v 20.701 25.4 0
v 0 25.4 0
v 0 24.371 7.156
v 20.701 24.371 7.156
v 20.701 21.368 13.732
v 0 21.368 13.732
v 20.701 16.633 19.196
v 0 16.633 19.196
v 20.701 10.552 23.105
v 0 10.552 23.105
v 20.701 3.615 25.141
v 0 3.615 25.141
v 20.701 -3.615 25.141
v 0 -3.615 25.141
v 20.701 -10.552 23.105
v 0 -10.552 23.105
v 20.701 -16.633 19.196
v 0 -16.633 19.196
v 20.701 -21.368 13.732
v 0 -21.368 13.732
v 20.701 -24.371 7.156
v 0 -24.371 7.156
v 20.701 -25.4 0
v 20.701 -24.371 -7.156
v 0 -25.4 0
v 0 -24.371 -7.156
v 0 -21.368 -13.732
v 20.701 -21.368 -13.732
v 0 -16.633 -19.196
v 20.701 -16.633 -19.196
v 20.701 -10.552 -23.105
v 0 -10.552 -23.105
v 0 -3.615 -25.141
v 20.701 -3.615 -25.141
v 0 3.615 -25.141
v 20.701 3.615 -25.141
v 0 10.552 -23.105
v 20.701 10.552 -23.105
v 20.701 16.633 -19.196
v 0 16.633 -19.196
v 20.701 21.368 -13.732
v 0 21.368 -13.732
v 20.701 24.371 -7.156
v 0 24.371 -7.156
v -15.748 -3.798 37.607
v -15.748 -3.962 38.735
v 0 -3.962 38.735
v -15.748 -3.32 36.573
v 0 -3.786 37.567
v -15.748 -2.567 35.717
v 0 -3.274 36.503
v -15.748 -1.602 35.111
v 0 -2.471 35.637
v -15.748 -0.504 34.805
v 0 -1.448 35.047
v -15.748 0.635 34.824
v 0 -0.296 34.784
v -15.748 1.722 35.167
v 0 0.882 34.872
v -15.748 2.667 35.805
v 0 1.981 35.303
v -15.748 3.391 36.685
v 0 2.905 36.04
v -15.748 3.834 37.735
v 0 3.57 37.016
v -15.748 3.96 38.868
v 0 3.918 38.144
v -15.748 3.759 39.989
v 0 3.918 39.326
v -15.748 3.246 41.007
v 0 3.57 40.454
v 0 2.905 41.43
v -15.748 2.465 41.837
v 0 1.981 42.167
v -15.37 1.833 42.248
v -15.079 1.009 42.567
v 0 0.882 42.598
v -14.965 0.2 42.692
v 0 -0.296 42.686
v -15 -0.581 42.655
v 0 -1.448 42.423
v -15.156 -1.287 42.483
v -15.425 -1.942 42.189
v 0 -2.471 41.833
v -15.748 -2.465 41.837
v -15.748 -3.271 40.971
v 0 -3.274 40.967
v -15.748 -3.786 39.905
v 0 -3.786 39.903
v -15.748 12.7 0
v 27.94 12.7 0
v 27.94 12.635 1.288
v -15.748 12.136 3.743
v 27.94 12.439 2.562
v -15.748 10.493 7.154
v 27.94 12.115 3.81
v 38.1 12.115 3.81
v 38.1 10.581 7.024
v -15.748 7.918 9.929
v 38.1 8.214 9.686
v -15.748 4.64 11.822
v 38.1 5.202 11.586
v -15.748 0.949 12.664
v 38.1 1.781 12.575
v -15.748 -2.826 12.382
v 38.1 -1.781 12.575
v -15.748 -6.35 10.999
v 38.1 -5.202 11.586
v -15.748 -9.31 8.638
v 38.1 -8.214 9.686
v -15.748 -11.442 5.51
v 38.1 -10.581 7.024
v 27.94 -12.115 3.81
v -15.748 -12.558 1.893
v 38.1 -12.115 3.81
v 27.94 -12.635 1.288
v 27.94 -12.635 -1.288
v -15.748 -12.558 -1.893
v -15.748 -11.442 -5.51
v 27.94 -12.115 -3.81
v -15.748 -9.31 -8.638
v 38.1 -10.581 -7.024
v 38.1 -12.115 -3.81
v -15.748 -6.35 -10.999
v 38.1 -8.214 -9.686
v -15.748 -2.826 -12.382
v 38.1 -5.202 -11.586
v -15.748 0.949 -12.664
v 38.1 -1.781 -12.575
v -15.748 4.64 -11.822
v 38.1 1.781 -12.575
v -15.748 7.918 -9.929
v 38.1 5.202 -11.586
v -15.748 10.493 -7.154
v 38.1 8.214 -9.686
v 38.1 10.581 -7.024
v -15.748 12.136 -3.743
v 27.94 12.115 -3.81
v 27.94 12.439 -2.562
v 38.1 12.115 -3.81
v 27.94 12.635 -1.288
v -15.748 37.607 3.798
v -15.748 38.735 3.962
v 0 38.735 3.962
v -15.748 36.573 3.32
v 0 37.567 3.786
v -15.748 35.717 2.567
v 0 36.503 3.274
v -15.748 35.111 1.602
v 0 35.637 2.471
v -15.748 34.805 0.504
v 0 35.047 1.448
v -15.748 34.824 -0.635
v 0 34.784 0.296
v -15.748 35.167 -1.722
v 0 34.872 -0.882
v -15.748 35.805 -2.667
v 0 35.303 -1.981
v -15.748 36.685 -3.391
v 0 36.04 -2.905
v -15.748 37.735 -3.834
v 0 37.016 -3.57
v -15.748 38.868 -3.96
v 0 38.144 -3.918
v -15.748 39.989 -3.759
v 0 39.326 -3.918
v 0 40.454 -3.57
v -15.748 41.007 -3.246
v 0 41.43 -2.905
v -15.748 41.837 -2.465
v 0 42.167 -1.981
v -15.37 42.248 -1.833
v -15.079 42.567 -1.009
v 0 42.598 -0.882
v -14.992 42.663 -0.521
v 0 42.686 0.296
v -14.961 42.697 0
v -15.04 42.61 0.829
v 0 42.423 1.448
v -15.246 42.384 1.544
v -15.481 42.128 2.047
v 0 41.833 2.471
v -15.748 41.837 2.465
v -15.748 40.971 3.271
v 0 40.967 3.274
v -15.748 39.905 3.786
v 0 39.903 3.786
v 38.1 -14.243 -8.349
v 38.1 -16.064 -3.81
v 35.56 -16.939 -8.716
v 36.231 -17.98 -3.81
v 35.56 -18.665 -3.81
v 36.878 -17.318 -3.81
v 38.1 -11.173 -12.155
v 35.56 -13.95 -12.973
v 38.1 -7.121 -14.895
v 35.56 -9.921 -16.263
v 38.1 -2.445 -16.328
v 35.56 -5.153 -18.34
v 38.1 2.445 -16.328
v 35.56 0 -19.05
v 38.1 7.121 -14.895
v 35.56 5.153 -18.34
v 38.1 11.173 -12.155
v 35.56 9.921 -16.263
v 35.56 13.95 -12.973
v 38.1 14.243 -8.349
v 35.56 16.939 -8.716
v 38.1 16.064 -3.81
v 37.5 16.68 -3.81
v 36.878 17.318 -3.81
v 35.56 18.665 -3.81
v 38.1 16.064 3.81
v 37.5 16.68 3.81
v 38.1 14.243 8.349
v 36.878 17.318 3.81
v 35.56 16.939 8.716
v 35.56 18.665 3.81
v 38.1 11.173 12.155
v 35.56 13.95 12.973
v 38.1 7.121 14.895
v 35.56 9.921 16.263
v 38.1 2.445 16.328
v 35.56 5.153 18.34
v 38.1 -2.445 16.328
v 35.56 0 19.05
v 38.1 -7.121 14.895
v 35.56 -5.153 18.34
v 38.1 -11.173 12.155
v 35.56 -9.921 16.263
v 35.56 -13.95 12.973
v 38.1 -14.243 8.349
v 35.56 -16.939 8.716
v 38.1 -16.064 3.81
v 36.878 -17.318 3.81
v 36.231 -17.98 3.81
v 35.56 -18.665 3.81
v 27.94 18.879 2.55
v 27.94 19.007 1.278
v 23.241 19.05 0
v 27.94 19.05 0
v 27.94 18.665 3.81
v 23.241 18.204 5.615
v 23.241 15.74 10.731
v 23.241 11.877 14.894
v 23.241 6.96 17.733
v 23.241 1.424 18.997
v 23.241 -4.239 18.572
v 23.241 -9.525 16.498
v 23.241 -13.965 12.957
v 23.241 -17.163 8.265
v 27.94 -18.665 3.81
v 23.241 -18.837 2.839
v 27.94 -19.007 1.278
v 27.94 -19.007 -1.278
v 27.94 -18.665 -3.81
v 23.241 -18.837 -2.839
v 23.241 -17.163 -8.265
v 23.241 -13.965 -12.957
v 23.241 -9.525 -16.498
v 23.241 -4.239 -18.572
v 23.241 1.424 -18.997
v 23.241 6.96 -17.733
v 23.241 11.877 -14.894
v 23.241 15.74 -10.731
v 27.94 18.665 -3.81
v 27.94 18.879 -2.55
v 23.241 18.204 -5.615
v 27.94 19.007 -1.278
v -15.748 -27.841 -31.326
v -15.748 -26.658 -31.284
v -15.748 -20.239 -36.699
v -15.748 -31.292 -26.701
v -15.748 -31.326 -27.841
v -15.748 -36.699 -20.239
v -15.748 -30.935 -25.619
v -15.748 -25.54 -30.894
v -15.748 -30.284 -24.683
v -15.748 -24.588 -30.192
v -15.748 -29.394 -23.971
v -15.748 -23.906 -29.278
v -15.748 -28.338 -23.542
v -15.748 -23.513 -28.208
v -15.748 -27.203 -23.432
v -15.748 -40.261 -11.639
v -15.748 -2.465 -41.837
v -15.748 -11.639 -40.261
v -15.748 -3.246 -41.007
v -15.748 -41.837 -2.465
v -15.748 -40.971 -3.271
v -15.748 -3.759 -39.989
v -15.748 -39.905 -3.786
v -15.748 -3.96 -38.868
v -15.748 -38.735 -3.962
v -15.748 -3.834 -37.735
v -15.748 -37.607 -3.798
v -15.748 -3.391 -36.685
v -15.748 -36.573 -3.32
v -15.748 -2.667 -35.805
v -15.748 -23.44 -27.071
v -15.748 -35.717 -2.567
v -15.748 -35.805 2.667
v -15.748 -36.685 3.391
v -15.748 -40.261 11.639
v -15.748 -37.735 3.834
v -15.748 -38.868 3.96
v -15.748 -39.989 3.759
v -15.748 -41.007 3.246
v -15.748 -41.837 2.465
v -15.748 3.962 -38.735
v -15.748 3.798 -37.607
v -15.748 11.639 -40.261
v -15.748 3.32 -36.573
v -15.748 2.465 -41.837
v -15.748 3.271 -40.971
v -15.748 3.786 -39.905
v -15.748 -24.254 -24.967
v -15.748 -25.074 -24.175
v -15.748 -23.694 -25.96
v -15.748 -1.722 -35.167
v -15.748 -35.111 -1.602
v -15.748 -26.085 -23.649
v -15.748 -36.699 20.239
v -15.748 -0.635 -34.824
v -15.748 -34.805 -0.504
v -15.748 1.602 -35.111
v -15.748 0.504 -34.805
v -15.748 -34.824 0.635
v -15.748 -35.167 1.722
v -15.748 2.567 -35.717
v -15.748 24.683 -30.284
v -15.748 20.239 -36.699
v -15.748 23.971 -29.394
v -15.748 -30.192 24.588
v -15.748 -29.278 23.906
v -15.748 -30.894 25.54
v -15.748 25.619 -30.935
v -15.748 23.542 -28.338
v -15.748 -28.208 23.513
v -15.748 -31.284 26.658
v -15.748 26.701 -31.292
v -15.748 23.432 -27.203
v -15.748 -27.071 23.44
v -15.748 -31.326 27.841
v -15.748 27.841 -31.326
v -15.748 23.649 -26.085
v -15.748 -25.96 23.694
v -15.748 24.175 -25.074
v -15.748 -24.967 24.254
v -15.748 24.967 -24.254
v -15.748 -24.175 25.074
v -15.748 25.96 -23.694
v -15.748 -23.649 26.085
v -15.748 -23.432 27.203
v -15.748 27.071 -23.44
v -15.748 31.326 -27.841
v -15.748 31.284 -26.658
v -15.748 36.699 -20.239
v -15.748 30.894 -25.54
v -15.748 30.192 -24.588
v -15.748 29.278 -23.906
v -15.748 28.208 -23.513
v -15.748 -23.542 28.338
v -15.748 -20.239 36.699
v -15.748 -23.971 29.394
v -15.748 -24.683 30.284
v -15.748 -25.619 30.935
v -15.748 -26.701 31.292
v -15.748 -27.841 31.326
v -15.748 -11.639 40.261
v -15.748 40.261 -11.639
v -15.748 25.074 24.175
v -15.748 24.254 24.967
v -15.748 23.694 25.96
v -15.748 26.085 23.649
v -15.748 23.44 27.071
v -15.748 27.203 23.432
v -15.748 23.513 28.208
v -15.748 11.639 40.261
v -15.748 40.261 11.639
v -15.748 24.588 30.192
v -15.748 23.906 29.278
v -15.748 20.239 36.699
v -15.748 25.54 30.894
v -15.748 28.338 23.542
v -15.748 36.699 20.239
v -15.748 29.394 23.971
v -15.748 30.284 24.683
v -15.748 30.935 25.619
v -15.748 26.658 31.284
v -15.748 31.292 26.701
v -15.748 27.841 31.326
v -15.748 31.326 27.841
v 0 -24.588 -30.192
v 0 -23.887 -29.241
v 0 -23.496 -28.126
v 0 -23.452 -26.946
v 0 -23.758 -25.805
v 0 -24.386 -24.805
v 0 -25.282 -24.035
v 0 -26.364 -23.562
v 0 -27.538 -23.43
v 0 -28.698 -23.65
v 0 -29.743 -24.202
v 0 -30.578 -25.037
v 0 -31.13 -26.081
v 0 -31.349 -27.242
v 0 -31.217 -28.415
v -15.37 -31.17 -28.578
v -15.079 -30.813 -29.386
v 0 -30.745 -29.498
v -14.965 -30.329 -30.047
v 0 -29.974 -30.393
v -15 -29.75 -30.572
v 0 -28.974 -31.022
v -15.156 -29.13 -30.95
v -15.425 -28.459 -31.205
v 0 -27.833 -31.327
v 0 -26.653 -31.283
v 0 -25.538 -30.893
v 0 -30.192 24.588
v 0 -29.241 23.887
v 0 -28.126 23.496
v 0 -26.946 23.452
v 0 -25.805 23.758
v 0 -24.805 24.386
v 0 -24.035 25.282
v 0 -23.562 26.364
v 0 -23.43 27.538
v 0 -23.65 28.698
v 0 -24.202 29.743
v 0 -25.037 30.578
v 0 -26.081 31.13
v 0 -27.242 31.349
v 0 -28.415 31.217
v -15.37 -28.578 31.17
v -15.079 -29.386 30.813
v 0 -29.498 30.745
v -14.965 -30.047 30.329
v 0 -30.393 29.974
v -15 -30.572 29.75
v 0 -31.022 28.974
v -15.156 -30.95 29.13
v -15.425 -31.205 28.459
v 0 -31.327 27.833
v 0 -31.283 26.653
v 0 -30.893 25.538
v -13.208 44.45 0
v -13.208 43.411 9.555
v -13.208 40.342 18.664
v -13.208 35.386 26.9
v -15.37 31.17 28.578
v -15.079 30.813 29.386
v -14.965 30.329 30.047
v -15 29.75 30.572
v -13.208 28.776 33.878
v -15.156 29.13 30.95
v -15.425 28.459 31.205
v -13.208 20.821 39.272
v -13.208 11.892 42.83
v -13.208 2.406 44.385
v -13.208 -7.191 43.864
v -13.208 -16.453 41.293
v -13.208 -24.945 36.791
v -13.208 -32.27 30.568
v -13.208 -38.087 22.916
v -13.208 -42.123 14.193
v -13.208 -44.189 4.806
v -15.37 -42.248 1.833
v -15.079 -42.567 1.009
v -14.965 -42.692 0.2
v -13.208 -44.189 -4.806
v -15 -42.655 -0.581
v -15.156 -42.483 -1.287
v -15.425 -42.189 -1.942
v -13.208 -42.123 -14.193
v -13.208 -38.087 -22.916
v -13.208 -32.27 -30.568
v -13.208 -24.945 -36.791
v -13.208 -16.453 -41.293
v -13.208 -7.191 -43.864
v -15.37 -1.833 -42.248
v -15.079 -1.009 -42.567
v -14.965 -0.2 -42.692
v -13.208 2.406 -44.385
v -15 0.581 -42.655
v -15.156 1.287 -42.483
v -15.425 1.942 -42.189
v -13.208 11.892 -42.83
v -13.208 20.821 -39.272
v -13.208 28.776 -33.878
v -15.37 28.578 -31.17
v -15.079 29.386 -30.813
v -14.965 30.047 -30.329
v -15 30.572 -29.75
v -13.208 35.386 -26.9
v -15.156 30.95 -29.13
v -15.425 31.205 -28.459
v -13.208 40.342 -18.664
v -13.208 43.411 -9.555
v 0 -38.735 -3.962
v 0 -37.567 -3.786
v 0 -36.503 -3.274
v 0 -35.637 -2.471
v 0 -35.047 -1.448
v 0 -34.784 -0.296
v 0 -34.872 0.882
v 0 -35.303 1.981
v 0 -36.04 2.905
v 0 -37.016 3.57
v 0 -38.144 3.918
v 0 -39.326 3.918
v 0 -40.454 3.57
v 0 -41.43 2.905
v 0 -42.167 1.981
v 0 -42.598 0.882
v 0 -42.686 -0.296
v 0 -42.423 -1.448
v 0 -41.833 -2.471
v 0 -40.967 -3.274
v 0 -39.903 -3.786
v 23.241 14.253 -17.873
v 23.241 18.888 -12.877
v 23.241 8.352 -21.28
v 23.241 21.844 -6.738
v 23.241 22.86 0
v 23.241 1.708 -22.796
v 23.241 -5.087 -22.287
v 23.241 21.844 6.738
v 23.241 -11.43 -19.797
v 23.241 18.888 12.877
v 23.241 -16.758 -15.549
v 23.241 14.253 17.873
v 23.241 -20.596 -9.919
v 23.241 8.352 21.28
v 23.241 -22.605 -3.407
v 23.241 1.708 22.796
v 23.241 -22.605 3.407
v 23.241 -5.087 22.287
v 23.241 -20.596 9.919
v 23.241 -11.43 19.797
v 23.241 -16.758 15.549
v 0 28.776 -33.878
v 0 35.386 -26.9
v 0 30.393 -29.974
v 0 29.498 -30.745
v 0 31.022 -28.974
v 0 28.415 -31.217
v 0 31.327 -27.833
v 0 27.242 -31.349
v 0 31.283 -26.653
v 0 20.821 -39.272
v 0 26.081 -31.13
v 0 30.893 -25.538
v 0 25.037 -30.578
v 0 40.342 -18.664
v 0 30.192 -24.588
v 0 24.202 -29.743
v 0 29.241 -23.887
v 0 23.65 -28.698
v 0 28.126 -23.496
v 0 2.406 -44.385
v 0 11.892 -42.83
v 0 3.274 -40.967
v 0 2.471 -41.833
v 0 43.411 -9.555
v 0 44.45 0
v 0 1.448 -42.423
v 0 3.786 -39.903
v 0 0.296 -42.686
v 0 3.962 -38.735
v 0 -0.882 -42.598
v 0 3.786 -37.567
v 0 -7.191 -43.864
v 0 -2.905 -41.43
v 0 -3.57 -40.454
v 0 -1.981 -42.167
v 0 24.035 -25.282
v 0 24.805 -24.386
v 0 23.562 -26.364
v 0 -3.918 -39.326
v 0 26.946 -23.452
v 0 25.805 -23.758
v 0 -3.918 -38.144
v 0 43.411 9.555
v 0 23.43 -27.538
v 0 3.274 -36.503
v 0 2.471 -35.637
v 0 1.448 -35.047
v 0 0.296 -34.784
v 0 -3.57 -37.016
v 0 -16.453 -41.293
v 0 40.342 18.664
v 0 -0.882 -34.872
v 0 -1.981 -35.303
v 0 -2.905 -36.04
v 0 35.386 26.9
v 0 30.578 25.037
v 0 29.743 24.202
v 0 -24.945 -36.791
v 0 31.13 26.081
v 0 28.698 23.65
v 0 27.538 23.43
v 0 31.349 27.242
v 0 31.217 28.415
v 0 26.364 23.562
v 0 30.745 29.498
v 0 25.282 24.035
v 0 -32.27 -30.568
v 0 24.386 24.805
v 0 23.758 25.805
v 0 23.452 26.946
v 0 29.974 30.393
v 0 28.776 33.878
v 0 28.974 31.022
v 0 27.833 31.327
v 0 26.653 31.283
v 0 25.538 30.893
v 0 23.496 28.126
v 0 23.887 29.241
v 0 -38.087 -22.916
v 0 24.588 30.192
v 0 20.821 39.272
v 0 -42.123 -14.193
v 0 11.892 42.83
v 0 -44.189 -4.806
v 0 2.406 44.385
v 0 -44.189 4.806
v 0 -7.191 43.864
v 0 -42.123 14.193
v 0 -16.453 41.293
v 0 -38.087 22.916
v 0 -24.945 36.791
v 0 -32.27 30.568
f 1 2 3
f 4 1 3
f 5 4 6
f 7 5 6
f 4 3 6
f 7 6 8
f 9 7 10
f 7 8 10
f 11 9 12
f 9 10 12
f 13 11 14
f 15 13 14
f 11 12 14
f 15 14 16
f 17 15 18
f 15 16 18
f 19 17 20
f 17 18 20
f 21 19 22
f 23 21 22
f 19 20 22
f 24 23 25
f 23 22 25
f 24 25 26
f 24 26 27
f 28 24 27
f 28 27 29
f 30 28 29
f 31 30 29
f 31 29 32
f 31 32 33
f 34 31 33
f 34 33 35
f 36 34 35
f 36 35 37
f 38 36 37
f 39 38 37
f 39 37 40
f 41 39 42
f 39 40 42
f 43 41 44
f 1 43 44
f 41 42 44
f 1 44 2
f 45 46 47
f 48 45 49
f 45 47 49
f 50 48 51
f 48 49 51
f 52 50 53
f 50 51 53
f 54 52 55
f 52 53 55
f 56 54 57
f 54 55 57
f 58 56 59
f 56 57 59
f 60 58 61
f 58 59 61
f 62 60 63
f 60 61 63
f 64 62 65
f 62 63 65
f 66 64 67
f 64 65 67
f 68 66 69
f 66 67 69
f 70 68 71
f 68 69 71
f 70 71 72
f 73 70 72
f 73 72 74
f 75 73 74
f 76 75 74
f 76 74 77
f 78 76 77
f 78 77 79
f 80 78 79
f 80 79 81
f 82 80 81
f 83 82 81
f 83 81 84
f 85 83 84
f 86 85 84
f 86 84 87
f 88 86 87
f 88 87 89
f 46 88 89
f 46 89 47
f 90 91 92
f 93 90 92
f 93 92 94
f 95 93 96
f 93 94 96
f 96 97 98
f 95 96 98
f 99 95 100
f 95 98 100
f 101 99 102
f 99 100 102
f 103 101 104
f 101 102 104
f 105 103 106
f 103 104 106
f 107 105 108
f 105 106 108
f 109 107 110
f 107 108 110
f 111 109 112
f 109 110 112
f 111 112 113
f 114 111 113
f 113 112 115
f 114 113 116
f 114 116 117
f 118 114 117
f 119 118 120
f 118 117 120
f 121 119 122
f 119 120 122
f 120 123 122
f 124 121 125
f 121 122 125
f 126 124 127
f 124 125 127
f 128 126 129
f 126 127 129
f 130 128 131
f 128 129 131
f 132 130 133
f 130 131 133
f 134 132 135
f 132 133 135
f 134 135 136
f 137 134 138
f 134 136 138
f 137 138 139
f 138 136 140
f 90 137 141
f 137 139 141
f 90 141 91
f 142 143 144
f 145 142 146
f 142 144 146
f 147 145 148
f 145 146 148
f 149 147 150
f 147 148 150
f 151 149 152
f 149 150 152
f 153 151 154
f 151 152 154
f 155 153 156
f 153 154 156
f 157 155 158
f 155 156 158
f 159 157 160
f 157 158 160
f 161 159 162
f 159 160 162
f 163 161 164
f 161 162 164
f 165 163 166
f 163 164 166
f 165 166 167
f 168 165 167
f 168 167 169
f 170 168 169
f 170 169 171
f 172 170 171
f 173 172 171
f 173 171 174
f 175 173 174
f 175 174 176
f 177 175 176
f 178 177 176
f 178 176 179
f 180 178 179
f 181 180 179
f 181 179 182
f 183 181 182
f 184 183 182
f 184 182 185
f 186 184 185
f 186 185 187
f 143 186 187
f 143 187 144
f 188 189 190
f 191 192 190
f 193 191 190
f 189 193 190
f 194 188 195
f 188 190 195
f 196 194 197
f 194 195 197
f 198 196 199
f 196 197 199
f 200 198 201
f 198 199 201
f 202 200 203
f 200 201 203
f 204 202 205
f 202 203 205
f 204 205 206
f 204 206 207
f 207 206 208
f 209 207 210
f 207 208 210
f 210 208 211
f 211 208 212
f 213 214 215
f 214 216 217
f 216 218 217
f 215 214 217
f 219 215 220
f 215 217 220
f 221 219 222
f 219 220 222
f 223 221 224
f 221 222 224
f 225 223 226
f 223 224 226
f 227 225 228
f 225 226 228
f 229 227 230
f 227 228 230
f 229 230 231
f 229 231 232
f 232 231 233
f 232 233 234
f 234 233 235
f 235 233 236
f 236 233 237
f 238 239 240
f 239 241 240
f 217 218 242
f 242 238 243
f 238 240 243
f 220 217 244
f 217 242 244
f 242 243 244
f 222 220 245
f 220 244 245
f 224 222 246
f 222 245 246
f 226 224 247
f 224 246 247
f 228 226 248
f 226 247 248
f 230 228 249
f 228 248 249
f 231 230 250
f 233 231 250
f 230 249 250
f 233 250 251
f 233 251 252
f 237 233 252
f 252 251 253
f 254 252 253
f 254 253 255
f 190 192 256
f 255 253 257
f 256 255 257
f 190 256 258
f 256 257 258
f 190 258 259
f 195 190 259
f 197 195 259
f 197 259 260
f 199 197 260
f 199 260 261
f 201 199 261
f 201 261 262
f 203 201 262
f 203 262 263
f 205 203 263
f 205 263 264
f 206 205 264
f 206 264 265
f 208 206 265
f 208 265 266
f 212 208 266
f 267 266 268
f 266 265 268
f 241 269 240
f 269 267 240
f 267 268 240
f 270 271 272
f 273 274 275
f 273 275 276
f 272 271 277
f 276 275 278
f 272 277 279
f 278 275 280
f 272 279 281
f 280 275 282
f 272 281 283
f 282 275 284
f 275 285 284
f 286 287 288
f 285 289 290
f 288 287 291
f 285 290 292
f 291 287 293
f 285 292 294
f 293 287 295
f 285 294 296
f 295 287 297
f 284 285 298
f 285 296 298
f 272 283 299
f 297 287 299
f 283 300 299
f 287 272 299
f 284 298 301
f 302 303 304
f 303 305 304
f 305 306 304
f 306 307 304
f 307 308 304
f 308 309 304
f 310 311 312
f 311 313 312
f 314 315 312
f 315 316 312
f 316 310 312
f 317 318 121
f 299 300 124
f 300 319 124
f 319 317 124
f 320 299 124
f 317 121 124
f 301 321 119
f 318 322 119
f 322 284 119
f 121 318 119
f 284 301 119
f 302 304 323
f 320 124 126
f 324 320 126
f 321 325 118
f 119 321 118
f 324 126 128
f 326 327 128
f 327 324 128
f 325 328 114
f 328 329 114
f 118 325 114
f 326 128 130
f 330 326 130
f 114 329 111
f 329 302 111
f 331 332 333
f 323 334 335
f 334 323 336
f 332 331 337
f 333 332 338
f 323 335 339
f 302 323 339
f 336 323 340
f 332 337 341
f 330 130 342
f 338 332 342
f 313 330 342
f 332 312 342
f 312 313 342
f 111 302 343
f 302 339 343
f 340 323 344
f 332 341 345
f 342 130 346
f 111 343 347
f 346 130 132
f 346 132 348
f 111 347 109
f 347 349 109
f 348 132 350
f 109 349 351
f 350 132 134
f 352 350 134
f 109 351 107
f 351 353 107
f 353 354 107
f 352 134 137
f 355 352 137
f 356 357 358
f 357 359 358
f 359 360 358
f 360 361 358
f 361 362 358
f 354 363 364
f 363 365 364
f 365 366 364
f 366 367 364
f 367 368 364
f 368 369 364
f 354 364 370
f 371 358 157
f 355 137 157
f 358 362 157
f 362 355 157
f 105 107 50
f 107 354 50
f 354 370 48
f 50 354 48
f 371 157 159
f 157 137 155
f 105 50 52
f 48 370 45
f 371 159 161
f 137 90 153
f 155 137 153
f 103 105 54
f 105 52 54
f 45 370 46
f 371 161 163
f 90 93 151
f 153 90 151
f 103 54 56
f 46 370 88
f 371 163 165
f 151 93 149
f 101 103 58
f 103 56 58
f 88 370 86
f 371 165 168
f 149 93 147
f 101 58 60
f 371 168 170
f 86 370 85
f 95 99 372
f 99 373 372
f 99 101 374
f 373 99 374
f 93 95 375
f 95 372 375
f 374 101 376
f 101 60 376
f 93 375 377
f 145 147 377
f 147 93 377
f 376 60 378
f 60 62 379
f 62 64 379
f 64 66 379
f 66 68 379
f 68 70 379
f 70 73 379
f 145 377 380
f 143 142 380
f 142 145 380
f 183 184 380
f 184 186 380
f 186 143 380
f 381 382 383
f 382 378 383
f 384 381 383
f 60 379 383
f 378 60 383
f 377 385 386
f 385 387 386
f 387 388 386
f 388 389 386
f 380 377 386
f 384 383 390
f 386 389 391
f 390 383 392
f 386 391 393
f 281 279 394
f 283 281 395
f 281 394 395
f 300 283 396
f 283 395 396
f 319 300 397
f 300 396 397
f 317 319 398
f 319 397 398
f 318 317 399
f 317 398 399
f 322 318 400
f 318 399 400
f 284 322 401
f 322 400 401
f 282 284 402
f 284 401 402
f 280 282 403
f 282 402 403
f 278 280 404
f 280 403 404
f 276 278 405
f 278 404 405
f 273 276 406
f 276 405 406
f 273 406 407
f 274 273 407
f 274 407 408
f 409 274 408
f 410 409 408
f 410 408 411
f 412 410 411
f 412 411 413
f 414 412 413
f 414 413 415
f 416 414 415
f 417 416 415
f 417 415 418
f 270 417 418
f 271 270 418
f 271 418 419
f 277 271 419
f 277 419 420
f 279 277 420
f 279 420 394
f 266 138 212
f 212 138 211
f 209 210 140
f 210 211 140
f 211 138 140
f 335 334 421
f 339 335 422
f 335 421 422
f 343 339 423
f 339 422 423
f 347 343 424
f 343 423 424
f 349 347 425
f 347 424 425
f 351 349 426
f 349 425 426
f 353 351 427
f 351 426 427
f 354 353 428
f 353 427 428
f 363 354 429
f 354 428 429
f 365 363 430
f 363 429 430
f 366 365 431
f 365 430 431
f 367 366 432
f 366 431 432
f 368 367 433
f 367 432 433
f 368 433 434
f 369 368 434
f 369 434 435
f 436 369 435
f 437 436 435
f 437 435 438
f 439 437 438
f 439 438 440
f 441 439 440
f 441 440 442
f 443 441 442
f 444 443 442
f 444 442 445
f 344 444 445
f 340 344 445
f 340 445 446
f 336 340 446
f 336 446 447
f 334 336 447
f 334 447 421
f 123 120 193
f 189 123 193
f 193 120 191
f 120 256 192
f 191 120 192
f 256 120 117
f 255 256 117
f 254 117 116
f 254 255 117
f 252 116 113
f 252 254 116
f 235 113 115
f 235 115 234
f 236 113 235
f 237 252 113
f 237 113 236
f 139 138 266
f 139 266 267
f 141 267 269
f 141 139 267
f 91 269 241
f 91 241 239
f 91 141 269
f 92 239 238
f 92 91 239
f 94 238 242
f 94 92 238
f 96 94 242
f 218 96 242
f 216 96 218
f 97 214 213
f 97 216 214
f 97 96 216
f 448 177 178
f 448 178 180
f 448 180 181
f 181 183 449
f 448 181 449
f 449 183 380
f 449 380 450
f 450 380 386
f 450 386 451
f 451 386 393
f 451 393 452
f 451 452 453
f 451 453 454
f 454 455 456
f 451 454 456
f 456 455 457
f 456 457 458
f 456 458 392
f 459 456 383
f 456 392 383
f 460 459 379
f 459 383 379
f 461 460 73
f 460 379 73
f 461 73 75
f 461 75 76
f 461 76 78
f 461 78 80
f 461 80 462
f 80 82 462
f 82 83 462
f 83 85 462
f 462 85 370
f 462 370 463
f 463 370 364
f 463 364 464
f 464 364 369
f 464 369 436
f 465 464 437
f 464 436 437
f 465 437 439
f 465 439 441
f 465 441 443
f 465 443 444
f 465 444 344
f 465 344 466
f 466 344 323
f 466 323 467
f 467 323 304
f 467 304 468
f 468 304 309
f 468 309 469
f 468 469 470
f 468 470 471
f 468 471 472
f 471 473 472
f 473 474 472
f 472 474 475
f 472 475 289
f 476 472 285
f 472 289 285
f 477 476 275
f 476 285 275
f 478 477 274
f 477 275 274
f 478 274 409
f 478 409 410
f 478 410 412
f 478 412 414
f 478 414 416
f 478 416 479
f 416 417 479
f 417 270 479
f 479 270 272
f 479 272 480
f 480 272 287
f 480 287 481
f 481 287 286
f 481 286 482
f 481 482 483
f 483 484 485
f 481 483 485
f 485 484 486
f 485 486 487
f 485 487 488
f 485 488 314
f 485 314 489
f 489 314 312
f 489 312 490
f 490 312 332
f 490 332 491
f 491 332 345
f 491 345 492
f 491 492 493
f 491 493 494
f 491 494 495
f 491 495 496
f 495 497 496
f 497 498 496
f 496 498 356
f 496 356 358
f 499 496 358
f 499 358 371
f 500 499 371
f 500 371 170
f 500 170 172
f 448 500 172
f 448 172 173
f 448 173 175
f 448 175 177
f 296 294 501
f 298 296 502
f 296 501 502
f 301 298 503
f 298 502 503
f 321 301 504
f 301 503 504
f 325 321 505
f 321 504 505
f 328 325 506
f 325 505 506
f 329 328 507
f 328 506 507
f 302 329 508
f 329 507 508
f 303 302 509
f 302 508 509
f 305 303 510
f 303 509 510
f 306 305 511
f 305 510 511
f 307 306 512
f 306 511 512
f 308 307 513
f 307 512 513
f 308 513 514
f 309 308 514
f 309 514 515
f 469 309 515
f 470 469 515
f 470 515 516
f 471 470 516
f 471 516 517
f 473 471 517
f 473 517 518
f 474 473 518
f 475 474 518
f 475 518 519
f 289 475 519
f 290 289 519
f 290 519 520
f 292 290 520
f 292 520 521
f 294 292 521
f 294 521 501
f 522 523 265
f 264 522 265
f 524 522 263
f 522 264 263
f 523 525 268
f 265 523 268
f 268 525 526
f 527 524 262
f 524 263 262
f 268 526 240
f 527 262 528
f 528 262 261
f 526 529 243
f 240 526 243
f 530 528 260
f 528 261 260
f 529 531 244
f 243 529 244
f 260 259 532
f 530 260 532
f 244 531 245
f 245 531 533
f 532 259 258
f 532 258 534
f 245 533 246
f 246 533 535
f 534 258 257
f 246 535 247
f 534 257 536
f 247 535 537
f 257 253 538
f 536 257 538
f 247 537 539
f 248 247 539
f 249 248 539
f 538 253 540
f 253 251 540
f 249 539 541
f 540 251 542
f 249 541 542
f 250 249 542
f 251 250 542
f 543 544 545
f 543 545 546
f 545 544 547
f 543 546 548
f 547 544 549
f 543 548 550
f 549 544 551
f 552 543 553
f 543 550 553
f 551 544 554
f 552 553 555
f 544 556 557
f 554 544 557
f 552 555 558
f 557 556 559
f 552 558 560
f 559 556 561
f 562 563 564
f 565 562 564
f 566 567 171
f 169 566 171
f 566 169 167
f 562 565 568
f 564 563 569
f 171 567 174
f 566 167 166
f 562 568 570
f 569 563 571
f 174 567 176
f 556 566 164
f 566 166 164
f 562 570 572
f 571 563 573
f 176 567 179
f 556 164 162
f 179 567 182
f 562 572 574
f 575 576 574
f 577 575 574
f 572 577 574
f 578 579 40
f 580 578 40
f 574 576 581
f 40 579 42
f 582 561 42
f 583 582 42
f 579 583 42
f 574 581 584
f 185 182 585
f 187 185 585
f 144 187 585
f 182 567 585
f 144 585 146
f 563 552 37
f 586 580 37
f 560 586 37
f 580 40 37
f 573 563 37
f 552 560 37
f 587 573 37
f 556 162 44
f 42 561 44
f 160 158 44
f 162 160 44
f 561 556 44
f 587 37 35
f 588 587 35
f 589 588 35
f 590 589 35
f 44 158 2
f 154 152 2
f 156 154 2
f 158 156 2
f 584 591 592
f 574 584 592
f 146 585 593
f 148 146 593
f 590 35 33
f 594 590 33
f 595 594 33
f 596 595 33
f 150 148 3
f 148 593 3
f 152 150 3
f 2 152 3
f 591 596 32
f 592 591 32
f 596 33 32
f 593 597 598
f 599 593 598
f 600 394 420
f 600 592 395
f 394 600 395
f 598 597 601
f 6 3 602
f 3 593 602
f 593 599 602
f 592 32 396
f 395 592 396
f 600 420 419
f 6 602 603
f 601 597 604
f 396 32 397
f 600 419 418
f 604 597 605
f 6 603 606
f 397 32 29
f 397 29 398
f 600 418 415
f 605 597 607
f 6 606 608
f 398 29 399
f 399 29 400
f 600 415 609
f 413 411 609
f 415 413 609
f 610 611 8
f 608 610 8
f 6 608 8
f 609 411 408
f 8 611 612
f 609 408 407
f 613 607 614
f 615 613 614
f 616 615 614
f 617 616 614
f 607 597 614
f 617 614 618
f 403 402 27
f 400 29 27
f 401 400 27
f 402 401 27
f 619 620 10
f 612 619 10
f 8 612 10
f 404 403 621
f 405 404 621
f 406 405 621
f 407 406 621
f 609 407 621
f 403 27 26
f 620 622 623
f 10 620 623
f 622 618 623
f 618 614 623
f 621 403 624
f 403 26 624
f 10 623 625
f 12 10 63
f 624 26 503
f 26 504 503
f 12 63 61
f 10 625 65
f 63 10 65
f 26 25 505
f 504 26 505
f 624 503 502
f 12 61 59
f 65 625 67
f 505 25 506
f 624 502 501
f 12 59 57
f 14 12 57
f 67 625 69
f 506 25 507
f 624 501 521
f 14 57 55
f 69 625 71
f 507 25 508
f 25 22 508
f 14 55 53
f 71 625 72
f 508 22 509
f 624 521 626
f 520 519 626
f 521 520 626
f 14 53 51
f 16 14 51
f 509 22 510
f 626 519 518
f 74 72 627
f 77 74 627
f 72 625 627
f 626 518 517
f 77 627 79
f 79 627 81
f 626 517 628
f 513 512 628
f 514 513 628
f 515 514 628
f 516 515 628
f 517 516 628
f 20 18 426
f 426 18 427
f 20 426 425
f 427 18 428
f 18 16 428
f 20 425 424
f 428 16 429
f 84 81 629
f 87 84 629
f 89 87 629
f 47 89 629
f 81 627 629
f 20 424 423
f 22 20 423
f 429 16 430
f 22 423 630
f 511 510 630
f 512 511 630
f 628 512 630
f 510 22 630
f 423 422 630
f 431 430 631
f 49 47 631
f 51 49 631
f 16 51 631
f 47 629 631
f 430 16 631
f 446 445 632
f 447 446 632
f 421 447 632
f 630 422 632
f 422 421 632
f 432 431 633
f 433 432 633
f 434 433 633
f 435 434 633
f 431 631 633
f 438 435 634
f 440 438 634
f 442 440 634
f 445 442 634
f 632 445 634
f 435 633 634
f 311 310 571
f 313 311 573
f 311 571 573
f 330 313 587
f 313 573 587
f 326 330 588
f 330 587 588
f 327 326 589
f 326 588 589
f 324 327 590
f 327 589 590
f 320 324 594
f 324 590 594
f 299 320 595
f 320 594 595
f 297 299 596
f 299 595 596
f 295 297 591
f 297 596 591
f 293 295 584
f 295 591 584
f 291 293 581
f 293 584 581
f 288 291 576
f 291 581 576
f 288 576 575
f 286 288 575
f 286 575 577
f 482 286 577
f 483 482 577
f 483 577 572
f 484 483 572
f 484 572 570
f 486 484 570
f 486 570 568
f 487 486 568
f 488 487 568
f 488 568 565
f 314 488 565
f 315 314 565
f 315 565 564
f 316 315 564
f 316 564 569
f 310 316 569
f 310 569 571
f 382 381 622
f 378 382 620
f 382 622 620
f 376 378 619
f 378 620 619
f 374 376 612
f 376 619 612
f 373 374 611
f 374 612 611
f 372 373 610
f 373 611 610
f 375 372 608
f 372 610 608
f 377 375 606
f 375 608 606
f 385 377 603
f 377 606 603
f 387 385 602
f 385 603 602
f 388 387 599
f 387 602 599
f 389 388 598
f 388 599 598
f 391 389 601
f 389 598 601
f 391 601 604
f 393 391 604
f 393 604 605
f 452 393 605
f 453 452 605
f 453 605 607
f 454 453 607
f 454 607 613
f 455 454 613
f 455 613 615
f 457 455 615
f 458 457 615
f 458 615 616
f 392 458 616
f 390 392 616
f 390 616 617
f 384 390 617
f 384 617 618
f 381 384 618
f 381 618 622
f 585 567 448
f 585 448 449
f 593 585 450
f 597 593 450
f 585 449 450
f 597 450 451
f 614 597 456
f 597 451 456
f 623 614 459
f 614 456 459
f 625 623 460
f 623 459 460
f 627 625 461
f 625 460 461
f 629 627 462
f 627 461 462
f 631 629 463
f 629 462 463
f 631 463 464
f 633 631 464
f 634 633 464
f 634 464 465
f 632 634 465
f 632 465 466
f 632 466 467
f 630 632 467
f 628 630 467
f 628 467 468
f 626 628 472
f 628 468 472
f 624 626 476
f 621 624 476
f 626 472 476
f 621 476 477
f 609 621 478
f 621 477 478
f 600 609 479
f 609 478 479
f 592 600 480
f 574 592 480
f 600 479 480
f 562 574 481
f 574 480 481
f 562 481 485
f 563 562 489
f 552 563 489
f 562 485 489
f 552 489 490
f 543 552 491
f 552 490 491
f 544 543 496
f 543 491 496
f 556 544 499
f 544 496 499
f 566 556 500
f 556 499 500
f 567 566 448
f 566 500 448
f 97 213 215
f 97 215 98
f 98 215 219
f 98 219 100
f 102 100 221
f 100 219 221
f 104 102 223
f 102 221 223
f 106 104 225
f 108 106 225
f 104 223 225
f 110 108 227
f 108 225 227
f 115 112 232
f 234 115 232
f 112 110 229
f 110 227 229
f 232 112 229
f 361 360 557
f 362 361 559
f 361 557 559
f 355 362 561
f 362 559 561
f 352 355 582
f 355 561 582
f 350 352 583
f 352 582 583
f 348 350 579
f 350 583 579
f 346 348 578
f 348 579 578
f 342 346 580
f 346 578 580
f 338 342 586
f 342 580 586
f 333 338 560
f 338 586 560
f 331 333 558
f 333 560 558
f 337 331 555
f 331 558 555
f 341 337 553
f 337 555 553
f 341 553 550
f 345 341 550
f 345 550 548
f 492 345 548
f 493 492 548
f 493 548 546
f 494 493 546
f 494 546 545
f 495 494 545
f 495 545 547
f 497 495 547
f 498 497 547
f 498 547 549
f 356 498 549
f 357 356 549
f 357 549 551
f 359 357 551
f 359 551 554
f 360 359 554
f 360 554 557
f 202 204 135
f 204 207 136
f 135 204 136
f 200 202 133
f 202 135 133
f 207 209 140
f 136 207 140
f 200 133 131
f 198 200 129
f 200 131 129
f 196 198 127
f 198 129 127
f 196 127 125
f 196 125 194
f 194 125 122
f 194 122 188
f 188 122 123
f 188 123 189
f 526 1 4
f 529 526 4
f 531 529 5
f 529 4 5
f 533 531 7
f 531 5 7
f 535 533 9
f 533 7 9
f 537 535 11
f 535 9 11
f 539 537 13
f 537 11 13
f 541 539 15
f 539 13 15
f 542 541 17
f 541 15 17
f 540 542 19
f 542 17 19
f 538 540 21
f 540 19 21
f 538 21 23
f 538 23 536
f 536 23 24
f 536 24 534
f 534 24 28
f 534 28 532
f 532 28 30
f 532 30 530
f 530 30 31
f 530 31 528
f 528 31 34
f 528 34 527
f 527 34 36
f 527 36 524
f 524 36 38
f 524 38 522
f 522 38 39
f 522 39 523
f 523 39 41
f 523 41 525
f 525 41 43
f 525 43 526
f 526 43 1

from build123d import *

# Parameters (mm, degrees)
F2_SIZE       = 2.54
F3_W          = 50.8
F3_H          = 7.62
F4_DEPTH      = 42.672
F6_R          = 3.9624
F7_DEPTH      = 38.608
F7_DEPTH_BACK = 9.398
F8_COUNT      = 8


with BuildPart() as f1:
    # F0 (on Top) → F1 (revolve)
    with BuildSketch(Plane.XY):
        Polygon((0, 25.4), (0, 44.45), (-15.748, 44.45), (-15.748, 12.7), (38.1, 12.7), (38.1, 19.05), (23.241, 19.05), (23.241, 25.4), align=None)
    revolve(axis=Axis((76.2, 0, 0), (1, 0, 0)))

    # F2
    f2_edges = [f1.edges().sort_by_distance(p)[0] for p in [
        (38.1, -19.05, 0),
        (23.241, -25.4, 0),
        (-15.748, -44.45, 0),
    ]]
    chamfer(f2_edges, length=F2_SIZE)


with BuildPart() as f4:
    # F3 (on Front) → F4 (new body, symmetric)
    with BuildSketch(Plane.XZ):
        with Locations((53.34, 0)):
            Rectangle(F3_W, F3_H)
    extrude(amount=F4_DEPTH, both=True)


with BuildPart() as f1_1:
    add(f1.part)

    # F5: cut F4
    add(f4.part, mode=Mode.SUBTRACT)


with BuildPart() as f7:
    # F6 (on face) → F7 (new body, two sides)
    with BuildSketch(Plane.YZ) as f7_sk:
        with Locations((0, -38.735)):
            Circle(F6_R)
    extrude(amount=-F7_DEPTH)
    extrude(f7_sk.sketch, amount=F7_DEPTH_BACK)


with BuildPart() as f8_1:
    # F8: instance of F7
    add(f7.part.rotate(Axis((-15.748, 0, 0), (1, 0, 0)), 1 * 360 / F8_COUNT))


with BuildPart() as f8_2:
    # F8: instance of F7
    add(f7.part.rotate(Axis((-15.748, 0, 0), (1, 0, 0)), 2 * 360 / F8_COUNT))


with BuildPart() as f8_3:
    # F8: instance of F7
    add(f7.part.rotate(Axis((-15.748, 0, 0), (1, 0, 0)), 3 * 360 / F8_COUNT))


with BuildPart() as f8_4:
    # F8: instance of F7
    add(f7.part.rotate(Axis((-15.748, 0, 0), (1, 0, 0)), 4 * 360 / F8_COUNT))


with BuildPart() as f8_5:
    # F8: instance of F7
    add(f7.part.rotate(Axis((-15.748, 0, 0), (1, 0, 0)), 5 * 360 / F8_COUNT))


with BuildPart() as f8_6:
    # F8: instance of F7
    add(f7.part.rotate(Axis((-15.748, 0, 0), (1, 0, 0)), 6 * 360 / F8_COUNT))


with BuildPart() as f8_7:
    # F8: instance of F7
    add(f7.part.rotate(Axis((-15.748, 0, 0), (1, 0, 0)), 7 * 360 / F8_COUNT))


with BuildPart() as f1_2:
    add(f1_1.part)

    # F9: cut F8_5, F7, F8_1, F8_4, F8_7, F8_6, F8_2, F8_3
    add(f8_5.part, mode=Mode.SUBTRACT)
    add(f7.part, mode=Mode.SUBTRACT)
    add(f8_1.part, mode=Mode.SUBTRACT)
    add(f8_4.part, mode=Mode.SUBTRACT)
    add(f8_7.part, mode=Mode.SUBTRACT)
    add(f8_6.part, mode=Mode.SUBTRACT)
    add(f8_2.part, mode=Mode.SUBTRACT)
    add(f8_3.part, mode=Mode.SUBTRACT)


solid = f1_2.part
